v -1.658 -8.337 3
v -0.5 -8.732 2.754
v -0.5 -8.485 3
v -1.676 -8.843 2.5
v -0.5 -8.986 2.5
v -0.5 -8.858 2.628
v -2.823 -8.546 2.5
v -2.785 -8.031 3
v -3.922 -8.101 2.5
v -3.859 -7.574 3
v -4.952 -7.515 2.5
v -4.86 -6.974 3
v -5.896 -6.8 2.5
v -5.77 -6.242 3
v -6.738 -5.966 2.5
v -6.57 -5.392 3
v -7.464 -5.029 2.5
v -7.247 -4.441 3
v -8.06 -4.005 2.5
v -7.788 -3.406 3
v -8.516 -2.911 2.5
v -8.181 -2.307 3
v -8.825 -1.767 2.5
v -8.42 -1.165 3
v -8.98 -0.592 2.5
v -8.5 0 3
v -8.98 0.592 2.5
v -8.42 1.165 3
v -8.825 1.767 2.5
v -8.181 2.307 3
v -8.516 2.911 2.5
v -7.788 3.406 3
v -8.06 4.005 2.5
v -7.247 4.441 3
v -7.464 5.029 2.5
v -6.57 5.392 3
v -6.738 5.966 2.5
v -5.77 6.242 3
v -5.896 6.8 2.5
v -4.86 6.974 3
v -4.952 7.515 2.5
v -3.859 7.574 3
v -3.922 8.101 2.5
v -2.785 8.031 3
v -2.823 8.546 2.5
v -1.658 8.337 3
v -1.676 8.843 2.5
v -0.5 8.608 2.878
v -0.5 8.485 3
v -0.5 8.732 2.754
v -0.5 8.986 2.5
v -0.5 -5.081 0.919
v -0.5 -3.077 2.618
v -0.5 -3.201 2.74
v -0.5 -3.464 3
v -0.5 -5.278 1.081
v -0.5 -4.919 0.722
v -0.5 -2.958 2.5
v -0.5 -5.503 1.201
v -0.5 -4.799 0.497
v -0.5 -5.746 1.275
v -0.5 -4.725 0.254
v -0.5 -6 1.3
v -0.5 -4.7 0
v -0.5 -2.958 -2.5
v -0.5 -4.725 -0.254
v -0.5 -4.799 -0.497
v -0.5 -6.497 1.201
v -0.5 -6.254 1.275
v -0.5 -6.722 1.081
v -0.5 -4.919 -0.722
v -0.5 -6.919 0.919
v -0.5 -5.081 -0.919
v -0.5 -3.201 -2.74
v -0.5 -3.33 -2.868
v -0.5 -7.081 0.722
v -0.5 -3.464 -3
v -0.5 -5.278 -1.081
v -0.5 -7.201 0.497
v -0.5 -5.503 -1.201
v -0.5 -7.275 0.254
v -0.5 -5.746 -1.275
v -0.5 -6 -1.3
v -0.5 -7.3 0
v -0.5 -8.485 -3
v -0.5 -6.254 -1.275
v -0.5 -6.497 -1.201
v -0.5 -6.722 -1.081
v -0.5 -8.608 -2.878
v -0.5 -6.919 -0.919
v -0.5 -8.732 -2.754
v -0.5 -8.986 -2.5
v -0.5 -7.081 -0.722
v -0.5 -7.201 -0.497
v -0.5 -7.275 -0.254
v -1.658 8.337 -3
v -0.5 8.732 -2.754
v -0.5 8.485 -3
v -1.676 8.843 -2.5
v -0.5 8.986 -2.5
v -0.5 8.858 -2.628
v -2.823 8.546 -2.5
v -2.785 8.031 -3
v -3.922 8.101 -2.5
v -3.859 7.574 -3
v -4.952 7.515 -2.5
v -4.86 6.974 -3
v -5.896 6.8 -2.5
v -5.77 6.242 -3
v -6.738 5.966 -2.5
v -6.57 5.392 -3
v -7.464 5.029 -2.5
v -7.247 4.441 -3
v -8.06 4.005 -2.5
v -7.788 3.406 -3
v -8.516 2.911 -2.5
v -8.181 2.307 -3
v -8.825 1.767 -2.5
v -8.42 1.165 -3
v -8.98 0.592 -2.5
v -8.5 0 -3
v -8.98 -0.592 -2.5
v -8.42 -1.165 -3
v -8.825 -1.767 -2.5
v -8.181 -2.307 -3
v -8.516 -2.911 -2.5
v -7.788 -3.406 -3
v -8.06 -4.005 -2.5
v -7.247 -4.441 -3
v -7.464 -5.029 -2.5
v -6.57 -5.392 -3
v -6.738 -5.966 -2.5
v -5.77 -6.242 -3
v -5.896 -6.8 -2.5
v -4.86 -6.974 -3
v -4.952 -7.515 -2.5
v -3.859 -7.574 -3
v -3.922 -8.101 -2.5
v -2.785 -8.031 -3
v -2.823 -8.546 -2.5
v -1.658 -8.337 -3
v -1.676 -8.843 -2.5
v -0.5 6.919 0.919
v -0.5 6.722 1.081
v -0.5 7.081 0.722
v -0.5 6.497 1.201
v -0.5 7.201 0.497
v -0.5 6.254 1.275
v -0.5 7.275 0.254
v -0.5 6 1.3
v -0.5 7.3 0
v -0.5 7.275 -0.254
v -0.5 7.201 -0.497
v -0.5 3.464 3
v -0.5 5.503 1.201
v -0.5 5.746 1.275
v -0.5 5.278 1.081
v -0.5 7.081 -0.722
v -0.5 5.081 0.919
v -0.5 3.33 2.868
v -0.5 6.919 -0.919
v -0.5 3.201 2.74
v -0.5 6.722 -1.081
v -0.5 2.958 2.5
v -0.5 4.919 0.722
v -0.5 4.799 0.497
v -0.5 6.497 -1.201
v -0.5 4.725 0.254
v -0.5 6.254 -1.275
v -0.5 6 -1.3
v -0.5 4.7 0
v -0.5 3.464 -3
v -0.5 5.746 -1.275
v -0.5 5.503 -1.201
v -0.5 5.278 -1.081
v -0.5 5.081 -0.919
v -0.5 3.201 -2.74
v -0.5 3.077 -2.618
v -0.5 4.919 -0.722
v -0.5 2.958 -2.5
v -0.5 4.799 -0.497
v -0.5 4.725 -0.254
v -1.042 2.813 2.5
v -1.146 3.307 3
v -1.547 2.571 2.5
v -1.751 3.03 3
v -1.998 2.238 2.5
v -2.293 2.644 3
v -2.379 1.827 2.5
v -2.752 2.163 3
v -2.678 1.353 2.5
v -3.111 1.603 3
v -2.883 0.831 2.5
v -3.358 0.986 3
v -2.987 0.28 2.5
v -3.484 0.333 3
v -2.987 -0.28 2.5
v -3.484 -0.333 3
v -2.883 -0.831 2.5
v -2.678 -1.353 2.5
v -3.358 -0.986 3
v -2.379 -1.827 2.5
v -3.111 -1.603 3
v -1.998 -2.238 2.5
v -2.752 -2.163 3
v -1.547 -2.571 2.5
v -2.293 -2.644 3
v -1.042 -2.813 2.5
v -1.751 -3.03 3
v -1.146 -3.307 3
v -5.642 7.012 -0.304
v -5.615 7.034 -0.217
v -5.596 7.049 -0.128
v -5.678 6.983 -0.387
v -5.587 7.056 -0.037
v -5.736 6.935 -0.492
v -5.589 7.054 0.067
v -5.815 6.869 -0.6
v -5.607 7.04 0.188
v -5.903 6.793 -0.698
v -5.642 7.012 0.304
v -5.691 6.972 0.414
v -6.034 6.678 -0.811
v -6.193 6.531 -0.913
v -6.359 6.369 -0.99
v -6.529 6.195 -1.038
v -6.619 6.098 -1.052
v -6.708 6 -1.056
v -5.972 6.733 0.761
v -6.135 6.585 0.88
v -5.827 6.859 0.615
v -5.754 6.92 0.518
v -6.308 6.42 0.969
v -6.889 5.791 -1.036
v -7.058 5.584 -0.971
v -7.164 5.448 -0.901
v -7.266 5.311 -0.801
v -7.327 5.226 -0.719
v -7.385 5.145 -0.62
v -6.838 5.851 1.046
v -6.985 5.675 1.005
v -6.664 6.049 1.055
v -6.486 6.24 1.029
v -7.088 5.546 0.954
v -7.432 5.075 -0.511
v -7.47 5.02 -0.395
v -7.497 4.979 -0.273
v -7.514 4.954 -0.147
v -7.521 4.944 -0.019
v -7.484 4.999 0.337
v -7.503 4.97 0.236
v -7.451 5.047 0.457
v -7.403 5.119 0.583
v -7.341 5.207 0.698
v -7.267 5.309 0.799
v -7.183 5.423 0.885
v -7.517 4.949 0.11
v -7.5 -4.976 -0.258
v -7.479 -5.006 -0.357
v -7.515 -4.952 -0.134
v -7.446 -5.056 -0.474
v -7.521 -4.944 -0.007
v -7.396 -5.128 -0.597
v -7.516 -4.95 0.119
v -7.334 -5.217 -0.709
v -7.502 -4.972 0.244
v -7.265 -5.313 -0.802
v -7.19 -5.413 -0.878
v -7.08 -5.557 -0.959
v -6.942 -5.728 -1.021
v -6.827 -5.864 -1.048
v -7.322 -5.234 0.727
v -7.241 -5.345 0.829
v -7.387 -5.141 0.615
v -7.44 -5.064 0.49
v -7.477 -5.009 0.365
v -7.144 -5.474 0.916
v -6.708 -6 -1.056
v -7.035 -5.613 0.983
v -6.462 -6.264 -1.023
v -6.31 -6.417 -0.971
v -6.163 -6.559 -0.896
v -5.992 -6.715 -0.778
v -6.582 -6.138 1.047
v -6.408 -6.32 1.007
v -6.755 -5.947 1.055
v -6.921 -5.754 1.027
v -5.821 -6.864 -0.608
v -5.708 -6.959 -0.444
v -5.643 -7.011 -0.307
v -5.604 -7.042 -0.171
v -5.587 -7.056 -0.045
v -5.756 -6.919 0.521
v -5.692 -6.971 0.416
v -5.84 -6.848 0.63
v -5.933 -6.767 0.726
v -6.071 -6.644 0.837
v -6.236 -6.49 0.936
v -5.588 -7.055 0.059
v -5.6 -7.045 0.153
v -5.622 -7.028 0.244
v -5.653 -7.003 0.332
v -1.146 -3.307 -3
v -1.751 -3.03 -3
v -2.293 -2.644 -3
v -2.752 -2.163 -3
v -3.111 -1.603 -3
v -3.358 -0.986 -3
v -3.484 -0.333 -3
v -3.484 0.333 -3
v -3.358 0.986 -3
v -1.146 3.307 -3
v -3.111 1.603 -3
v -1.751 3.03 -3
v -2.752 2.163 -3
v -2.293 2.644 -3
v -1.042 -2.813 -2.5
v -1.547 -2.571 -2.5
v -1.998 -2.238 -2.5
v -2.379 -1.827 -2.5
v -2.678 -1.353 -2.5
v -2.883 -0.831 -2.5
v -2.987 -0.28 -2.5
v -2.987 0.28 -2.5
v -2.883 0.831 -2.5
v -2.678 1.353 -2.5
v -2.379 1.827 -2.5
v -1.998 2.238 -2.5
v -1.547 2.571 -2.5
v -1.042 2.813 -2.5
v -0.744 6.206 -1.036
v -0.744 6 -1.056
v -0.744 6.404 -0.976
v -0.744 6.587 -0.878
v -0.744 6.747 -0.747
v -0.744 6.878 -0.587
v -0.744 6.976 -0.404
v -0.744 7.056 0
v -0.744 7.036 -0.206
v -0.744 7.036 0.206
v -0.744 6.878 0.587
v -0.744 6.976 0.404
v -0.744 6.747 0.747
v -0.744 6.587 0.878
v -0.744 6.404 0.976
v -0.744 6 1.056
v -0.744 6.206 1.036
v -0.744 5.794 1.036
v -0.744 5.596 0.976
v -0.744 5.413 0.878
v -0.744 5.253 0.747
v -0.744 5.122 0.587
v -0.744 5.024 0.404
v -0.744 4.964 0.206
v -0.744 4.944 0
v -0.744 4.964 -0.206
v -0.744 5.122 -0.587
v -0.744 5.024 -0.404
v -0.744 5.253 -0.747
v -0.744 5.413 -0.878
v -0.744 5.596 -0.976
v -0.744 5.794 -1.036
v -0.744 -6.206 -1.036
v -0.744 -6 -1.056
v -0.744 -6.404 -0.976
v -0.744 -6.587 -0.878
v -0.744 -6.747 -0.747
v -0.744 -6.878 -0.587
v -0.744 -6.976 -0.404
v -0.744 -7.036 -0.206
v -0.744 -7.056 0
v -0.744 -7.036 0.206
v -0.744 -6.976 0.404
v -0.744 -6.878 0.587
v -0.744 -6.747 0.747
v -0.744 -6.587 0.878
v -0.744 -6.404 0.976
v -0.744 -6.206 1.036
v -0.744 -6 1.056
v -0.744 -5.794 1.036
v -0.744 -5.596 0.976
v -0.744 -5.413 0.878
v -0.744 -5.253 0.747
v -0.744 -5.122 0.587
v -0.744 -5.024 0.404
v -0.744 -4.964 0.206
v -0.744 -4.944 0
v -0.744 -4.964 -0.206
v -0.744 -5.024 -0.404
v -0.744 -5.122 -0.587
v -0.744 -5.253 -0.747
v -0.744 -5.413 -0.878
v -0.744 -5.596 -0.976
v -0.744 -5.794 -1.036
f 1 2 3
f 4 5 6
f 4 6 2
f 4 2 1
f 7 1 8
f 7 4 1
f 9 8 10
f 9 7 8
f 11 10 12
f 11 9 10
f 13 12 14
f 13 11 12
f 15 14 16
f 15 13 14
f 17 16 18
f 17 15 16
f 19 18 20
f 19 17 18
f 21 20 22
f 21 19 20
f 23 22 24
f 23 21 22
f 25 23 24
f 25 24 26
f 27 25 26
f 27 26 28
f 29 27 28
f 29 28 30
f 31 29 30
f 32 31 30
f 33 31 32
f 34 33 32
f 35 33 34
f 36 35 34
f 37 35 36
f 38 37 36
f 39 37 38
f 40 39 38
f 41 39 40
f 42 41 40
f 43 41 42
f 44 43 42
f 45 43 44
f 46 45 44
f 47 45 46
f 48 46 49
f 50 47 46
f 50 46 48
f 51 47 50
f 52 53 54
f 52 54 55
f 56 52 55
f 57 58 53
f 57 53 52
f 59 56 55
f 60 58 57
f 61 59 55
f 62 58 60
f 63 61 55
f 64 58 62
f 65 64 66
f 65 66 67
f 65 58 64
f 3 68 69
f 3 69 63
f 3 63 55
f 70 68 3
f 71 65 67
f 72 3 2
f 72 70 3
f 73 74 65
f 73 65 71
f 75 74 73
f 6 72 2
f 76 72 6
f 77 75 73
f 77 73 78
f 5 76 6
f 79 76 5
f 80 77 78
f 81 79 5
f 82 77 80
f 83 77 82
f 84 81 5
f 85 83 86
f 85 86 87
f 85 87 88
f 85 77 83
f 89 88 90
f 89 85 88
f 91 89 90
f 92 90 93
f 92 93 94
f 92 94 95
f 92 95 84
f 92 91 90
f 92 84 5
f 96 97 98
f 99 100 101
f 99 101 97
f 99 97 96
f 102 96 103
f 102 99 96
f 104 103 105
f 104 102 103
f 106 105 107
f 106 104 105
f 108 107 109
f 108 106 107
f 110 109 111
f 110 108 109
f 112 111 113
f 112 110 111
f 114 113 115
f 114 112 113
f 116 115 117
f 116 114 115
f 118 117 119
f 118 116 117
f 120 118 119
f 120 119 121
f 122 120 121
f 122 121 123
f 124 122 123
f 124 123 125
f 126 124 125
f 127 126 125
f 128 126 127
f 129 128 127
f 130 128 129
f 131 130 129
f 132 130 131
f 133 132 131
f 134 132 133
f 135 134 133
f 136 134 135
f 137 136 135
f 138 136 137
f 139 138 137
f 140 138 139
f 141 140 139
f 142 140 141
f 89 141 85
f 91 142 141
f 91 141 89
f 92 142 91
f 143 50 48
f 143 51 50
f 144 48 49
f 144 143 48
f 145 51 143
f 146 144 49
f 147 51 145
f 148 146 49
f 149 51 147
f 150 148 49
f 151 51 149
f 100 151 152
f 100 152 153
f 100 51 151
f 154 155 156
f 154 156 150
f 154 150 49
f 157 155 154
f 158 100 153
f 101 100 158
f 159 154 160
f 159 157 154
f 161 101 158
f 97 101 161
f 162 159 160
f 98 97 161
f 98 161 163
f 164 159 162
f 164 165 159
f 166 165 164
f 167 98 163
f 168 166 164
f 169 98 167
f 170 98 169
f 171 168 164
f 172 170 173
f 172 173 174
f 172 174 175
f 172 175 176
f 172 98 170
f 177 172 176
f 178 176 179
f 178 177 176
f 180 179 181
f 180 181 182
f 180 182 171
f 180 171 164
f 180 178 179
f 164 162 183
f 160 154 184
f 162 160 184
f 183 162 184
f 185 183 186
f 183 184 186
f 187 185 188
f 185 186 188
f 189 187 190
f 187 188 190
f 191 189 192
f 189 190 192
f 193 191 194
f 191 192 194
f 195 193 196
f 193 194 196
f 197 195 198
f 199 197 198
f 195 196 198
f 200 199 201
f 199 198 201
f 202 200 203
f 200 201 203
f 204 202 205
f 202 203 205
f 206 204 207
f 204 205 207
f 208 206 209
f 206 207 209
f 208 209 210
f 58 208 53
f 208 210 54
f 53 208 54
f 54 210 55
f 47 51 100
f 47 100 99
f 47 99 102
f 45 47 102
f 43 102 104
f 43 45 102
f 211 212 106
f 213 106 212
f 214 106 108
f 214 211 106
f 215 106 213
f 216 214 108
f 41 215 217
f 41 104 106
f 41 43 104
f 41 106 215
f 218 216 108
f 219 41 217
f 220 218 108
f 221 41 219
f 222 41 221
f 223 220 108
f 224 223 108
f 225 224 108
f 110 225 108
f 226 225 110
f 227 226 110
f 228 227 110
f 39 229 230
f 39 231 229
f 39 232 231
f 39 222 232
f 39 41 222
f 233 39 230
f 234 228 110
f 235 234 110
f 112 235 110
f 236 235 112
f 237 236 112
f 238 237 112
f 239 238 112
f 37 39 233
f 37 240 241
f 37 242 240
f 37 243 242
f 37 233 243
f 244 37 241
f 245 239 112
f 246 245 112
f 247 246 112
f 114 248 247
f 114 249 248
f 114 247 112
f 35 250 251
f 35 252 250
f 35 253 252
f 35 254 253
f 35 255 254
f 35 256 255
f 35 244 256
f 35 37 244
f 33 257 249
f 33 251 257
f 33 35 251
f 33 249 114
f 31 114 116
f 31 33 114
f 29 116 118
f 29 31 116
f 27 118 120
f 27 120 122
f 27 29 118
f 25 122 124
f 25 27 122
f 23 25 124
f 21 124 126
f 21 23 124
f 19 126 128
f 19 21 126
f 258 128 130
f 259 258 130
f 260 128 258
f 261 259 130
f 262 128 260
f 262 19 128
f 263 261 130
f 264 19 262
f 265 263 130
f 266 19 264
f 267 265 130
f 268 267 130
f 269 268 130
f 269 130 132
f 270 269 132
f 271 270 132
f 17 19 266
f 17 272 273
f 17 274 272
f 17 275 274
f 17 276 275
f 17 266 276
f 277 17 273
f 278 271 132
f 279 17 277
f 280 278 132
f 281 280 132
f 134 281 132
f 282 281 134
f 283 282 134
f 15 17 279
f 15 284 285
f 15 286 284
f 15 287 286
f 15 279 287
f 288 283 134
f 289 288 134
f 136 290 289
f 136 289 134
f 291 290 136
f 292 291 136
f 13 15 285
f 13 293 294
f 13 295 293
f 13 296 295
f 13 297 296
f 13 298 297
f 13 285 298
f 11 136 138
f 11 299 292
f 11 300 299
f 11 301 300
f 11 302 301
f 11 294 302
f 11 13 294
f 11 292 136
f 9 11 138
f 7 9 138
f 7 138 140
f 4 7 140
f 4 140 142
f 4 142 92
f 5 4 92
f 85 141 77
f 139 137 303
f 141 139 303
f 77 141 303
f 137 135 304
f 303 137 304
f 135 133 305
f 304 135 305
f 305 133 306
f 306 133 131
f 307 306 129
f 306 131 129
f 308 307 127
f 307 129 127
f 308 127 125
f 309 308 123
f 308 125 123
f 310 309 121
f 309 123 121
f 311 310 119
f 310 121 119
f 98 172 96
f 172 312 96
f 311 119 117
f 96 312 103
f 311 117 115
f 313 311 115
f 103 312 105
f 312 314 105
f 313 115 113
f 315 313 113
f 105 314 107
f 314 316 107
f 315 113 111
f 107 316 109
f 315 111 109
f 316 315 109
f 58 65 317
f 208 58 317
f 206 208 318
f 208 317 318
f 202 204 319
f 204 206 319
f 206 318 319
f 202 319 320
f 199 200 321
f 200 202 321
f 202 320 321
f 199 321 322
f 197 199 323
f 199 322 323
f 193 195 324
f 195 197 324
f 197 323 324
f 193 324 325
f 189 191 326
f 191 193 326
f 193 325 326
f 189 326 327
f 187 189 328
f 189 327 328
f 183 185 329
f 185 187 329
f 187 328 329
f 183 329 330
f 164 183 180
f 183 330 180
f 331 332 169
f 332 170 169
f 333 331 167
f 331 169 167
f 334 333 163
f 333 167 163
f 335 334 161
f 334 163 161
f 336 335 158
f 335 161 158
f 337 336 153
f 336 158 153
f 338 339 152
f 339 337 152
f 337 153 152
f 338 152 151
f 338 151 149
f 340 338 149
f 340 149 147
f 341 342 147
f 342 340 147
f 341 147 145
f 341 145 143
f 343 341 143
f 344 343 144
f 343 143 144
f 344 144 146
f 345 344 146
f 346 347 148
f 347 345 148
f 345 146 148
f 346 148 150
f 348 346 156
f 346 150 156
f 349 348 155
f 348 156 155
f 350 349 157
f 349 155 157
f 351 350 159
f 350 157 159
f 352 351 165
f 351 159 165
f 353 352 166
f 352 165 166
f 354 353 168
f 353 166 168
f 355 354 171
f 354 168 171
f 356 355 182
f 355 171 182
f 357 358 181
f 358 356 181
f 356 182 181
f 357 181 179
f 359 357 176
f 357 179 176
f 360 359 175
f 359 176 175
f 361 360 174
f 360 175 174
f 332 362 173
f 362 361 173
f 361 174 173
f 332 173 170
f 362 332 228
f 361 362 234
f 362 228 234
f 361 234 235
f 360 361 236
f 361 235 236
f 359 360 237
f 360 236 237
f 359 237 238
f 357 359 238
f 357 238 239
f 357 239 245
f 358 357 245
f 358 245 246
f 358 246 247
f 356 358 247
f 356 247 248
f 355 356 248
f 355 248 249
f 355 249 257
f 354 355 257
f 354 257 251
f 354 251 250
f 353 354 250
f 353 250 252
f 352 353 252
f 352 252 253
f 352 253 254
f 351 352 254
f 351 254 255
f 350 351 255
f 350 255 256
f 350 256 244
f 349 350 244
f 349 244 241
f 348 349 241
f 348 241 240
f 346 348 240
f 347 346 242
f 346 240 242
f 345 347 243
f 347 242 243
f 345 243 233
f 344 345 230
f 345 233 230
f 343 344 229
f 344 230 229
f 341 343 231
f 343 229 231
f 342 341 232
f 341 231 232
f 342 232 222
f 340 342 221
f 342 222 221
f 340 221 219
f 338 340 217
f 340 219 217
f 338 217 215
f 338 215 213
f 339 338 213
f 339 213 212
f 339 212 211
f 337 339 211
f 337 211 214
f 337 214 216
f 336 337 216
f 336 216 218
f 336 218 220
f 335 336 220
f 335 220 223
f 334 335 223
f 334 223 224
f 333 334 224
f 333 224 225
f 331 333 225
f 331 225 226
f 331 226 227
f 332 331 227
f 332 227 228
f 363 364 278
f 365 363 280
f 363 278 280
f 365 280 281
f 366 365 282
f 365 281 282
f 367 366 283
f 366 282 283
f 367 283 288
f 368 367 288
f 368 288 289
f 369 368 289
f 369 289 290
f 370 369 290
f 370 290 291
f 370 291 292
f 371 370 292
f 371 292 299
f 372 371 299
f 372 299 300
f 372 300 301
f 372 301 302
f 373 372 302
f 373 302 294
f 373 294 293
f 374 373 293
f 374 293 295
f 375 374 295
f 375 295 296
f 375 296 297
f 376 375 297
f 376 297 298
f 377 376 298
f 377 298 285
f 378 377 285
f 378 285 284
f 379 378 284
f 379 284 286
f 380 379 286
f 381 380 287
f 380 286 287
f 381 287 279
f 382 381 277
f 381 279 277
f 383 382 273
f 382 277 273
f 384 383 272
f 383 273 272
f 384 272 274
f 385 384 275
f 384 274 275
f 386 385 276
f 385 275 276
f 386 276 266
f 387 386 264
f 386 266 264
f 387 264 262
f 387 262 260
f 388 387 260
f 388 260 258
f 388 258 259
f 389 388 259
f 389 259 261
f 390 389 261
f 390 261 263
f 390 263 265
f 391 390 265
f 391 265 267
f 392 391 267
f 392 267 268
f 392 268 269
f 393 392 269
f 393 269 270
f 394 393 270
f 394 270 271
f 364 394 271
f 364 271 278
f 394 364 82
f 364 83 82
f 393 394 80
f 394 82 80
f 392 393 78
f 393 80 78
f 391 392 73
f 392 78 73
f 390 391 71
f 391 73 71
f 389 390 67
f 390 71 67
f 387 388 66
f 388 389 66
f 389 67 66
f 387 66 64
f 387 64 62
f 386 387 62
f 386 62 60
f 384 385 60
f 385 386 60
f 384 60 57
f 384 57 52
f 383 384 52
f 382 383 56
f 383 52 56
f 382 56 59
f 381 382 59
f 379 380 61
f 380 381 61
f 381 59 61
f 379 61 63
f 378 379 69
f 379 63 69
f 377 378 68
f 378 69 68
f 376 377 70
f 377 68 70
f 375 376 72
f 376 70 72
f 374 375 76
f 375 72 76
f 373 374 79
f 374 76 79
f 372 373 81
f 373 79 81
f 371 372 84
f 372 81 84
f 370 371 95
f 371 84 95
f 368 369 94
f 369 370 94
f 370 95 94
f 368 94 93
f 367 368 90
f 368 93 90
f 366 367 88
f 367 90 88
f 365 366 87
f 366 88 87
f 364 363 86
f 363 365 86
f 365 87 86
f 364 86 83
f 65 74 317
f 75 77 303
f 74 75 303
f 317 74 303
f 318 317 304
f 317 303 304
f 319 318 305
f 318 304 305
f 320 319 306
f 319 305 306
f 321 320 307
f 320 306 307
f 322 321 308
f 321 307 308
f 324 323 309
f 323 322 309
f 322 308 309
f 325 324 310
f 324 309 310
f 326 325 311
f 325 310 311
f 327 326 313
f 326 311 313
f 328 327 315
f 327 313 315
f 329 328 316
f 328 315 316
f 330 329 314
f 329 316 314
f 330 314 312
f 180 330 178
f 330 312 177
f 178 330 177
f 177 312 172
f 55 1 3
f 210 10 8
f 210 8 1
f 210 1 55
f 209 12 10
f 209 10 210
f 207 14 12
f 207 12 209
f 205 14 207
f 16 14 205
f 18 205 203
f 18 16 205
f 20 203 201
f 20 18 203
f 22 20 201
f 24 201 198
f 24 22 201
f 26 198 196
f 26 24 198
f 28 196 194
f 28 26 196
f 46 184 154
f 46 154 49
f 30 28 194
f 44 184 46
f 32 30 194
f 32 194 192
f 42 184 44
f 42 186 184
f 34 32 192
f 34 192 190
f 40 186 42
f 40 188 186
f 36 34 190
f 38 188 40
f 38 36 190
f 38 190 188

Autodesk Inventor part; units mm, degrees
sketch "Sketch_1" plane through (0, 0, 0) normal (1, 0, 0) x (0, 1, 0)
  line L0 (0, -3) -> (0, 3)
  line L1 (8.5, 3) -> (3.5, 3)
  line L2 (3.5, 3) -> (3, 2.5)
  line L3 (3, 2.5) -> (3, -2.5)
  line L4 (3, -2.5) -> (3.5, -3)
  line L5 (3.5, -3) -> (8.5, -3)
  line L6 (8.5, -3) -> (9, -2.5)
  line L7 (9, -2.5) -> (9, 2.5)
  line L8 (9, 2.5) -> (8.5, 3)
revolve "Revolution1" add sketch "Sketch_1" angle 180 about axis through (0, 0, -3) along (0, 0, 1)
sketch "Sketch_2" plane through (0, 0, 0) normal (0, 0, 1) x (1, 0, 0)
  line L0 (-0.5, -10) -> (0.5, -10)
  line L1 (0.5, -10) -> (0.5, 10)
  line L2 (0.5, 10) -> (-0.5, 10)
  line L3 (-0.5, 10) -> (-0.5, -10)
extrude "Extrusion1" cut sketch "Sketch_2" along normal mid plane 6
sketch "Sketch3" plane through (-0.5, -8.4853, -3) normal (1, 0, 0) x (0, 0, -1)
  point P0 (-3, 2.4853)
hole "Hole1" at (-0.5, -6, 0) direction (-1, 0, 0) diameter 2.1129 depth 9 countersink diameter 2.6 countersink angle 90 thread size "M2.6x0.45" class "6H" standard "ISO Metric profile"
sketch "Sketch4" plane through (-0.5, 3.4641, 3) normal (1, 0, 0) x (0, 0, -1)
  point P0 (3, 2.5359)
hole "Hole2" at (-0.5, 6, 0) direction (-1, 0, 0) diameter 2.1129 depth 9 countersink diameter 2.6 countersink angle 90 thread size "M2.6x0.45" class "6H" standard "ISO Metric profile"
ref_plane "2_1_XY" through (0, 0, 0) normal (1, 0, 0) x (0, 0, -1)
ref_plane "2_1_YZ" through (0, 0, 0) normal (0, 0, -1) x (0, 1, 0)
ref_plane "2_1_ZX" through (0, 0, 0) normal (0, 1, 0) x (1, 0, 0)
properties part number "PSCSPJ6-6p"
